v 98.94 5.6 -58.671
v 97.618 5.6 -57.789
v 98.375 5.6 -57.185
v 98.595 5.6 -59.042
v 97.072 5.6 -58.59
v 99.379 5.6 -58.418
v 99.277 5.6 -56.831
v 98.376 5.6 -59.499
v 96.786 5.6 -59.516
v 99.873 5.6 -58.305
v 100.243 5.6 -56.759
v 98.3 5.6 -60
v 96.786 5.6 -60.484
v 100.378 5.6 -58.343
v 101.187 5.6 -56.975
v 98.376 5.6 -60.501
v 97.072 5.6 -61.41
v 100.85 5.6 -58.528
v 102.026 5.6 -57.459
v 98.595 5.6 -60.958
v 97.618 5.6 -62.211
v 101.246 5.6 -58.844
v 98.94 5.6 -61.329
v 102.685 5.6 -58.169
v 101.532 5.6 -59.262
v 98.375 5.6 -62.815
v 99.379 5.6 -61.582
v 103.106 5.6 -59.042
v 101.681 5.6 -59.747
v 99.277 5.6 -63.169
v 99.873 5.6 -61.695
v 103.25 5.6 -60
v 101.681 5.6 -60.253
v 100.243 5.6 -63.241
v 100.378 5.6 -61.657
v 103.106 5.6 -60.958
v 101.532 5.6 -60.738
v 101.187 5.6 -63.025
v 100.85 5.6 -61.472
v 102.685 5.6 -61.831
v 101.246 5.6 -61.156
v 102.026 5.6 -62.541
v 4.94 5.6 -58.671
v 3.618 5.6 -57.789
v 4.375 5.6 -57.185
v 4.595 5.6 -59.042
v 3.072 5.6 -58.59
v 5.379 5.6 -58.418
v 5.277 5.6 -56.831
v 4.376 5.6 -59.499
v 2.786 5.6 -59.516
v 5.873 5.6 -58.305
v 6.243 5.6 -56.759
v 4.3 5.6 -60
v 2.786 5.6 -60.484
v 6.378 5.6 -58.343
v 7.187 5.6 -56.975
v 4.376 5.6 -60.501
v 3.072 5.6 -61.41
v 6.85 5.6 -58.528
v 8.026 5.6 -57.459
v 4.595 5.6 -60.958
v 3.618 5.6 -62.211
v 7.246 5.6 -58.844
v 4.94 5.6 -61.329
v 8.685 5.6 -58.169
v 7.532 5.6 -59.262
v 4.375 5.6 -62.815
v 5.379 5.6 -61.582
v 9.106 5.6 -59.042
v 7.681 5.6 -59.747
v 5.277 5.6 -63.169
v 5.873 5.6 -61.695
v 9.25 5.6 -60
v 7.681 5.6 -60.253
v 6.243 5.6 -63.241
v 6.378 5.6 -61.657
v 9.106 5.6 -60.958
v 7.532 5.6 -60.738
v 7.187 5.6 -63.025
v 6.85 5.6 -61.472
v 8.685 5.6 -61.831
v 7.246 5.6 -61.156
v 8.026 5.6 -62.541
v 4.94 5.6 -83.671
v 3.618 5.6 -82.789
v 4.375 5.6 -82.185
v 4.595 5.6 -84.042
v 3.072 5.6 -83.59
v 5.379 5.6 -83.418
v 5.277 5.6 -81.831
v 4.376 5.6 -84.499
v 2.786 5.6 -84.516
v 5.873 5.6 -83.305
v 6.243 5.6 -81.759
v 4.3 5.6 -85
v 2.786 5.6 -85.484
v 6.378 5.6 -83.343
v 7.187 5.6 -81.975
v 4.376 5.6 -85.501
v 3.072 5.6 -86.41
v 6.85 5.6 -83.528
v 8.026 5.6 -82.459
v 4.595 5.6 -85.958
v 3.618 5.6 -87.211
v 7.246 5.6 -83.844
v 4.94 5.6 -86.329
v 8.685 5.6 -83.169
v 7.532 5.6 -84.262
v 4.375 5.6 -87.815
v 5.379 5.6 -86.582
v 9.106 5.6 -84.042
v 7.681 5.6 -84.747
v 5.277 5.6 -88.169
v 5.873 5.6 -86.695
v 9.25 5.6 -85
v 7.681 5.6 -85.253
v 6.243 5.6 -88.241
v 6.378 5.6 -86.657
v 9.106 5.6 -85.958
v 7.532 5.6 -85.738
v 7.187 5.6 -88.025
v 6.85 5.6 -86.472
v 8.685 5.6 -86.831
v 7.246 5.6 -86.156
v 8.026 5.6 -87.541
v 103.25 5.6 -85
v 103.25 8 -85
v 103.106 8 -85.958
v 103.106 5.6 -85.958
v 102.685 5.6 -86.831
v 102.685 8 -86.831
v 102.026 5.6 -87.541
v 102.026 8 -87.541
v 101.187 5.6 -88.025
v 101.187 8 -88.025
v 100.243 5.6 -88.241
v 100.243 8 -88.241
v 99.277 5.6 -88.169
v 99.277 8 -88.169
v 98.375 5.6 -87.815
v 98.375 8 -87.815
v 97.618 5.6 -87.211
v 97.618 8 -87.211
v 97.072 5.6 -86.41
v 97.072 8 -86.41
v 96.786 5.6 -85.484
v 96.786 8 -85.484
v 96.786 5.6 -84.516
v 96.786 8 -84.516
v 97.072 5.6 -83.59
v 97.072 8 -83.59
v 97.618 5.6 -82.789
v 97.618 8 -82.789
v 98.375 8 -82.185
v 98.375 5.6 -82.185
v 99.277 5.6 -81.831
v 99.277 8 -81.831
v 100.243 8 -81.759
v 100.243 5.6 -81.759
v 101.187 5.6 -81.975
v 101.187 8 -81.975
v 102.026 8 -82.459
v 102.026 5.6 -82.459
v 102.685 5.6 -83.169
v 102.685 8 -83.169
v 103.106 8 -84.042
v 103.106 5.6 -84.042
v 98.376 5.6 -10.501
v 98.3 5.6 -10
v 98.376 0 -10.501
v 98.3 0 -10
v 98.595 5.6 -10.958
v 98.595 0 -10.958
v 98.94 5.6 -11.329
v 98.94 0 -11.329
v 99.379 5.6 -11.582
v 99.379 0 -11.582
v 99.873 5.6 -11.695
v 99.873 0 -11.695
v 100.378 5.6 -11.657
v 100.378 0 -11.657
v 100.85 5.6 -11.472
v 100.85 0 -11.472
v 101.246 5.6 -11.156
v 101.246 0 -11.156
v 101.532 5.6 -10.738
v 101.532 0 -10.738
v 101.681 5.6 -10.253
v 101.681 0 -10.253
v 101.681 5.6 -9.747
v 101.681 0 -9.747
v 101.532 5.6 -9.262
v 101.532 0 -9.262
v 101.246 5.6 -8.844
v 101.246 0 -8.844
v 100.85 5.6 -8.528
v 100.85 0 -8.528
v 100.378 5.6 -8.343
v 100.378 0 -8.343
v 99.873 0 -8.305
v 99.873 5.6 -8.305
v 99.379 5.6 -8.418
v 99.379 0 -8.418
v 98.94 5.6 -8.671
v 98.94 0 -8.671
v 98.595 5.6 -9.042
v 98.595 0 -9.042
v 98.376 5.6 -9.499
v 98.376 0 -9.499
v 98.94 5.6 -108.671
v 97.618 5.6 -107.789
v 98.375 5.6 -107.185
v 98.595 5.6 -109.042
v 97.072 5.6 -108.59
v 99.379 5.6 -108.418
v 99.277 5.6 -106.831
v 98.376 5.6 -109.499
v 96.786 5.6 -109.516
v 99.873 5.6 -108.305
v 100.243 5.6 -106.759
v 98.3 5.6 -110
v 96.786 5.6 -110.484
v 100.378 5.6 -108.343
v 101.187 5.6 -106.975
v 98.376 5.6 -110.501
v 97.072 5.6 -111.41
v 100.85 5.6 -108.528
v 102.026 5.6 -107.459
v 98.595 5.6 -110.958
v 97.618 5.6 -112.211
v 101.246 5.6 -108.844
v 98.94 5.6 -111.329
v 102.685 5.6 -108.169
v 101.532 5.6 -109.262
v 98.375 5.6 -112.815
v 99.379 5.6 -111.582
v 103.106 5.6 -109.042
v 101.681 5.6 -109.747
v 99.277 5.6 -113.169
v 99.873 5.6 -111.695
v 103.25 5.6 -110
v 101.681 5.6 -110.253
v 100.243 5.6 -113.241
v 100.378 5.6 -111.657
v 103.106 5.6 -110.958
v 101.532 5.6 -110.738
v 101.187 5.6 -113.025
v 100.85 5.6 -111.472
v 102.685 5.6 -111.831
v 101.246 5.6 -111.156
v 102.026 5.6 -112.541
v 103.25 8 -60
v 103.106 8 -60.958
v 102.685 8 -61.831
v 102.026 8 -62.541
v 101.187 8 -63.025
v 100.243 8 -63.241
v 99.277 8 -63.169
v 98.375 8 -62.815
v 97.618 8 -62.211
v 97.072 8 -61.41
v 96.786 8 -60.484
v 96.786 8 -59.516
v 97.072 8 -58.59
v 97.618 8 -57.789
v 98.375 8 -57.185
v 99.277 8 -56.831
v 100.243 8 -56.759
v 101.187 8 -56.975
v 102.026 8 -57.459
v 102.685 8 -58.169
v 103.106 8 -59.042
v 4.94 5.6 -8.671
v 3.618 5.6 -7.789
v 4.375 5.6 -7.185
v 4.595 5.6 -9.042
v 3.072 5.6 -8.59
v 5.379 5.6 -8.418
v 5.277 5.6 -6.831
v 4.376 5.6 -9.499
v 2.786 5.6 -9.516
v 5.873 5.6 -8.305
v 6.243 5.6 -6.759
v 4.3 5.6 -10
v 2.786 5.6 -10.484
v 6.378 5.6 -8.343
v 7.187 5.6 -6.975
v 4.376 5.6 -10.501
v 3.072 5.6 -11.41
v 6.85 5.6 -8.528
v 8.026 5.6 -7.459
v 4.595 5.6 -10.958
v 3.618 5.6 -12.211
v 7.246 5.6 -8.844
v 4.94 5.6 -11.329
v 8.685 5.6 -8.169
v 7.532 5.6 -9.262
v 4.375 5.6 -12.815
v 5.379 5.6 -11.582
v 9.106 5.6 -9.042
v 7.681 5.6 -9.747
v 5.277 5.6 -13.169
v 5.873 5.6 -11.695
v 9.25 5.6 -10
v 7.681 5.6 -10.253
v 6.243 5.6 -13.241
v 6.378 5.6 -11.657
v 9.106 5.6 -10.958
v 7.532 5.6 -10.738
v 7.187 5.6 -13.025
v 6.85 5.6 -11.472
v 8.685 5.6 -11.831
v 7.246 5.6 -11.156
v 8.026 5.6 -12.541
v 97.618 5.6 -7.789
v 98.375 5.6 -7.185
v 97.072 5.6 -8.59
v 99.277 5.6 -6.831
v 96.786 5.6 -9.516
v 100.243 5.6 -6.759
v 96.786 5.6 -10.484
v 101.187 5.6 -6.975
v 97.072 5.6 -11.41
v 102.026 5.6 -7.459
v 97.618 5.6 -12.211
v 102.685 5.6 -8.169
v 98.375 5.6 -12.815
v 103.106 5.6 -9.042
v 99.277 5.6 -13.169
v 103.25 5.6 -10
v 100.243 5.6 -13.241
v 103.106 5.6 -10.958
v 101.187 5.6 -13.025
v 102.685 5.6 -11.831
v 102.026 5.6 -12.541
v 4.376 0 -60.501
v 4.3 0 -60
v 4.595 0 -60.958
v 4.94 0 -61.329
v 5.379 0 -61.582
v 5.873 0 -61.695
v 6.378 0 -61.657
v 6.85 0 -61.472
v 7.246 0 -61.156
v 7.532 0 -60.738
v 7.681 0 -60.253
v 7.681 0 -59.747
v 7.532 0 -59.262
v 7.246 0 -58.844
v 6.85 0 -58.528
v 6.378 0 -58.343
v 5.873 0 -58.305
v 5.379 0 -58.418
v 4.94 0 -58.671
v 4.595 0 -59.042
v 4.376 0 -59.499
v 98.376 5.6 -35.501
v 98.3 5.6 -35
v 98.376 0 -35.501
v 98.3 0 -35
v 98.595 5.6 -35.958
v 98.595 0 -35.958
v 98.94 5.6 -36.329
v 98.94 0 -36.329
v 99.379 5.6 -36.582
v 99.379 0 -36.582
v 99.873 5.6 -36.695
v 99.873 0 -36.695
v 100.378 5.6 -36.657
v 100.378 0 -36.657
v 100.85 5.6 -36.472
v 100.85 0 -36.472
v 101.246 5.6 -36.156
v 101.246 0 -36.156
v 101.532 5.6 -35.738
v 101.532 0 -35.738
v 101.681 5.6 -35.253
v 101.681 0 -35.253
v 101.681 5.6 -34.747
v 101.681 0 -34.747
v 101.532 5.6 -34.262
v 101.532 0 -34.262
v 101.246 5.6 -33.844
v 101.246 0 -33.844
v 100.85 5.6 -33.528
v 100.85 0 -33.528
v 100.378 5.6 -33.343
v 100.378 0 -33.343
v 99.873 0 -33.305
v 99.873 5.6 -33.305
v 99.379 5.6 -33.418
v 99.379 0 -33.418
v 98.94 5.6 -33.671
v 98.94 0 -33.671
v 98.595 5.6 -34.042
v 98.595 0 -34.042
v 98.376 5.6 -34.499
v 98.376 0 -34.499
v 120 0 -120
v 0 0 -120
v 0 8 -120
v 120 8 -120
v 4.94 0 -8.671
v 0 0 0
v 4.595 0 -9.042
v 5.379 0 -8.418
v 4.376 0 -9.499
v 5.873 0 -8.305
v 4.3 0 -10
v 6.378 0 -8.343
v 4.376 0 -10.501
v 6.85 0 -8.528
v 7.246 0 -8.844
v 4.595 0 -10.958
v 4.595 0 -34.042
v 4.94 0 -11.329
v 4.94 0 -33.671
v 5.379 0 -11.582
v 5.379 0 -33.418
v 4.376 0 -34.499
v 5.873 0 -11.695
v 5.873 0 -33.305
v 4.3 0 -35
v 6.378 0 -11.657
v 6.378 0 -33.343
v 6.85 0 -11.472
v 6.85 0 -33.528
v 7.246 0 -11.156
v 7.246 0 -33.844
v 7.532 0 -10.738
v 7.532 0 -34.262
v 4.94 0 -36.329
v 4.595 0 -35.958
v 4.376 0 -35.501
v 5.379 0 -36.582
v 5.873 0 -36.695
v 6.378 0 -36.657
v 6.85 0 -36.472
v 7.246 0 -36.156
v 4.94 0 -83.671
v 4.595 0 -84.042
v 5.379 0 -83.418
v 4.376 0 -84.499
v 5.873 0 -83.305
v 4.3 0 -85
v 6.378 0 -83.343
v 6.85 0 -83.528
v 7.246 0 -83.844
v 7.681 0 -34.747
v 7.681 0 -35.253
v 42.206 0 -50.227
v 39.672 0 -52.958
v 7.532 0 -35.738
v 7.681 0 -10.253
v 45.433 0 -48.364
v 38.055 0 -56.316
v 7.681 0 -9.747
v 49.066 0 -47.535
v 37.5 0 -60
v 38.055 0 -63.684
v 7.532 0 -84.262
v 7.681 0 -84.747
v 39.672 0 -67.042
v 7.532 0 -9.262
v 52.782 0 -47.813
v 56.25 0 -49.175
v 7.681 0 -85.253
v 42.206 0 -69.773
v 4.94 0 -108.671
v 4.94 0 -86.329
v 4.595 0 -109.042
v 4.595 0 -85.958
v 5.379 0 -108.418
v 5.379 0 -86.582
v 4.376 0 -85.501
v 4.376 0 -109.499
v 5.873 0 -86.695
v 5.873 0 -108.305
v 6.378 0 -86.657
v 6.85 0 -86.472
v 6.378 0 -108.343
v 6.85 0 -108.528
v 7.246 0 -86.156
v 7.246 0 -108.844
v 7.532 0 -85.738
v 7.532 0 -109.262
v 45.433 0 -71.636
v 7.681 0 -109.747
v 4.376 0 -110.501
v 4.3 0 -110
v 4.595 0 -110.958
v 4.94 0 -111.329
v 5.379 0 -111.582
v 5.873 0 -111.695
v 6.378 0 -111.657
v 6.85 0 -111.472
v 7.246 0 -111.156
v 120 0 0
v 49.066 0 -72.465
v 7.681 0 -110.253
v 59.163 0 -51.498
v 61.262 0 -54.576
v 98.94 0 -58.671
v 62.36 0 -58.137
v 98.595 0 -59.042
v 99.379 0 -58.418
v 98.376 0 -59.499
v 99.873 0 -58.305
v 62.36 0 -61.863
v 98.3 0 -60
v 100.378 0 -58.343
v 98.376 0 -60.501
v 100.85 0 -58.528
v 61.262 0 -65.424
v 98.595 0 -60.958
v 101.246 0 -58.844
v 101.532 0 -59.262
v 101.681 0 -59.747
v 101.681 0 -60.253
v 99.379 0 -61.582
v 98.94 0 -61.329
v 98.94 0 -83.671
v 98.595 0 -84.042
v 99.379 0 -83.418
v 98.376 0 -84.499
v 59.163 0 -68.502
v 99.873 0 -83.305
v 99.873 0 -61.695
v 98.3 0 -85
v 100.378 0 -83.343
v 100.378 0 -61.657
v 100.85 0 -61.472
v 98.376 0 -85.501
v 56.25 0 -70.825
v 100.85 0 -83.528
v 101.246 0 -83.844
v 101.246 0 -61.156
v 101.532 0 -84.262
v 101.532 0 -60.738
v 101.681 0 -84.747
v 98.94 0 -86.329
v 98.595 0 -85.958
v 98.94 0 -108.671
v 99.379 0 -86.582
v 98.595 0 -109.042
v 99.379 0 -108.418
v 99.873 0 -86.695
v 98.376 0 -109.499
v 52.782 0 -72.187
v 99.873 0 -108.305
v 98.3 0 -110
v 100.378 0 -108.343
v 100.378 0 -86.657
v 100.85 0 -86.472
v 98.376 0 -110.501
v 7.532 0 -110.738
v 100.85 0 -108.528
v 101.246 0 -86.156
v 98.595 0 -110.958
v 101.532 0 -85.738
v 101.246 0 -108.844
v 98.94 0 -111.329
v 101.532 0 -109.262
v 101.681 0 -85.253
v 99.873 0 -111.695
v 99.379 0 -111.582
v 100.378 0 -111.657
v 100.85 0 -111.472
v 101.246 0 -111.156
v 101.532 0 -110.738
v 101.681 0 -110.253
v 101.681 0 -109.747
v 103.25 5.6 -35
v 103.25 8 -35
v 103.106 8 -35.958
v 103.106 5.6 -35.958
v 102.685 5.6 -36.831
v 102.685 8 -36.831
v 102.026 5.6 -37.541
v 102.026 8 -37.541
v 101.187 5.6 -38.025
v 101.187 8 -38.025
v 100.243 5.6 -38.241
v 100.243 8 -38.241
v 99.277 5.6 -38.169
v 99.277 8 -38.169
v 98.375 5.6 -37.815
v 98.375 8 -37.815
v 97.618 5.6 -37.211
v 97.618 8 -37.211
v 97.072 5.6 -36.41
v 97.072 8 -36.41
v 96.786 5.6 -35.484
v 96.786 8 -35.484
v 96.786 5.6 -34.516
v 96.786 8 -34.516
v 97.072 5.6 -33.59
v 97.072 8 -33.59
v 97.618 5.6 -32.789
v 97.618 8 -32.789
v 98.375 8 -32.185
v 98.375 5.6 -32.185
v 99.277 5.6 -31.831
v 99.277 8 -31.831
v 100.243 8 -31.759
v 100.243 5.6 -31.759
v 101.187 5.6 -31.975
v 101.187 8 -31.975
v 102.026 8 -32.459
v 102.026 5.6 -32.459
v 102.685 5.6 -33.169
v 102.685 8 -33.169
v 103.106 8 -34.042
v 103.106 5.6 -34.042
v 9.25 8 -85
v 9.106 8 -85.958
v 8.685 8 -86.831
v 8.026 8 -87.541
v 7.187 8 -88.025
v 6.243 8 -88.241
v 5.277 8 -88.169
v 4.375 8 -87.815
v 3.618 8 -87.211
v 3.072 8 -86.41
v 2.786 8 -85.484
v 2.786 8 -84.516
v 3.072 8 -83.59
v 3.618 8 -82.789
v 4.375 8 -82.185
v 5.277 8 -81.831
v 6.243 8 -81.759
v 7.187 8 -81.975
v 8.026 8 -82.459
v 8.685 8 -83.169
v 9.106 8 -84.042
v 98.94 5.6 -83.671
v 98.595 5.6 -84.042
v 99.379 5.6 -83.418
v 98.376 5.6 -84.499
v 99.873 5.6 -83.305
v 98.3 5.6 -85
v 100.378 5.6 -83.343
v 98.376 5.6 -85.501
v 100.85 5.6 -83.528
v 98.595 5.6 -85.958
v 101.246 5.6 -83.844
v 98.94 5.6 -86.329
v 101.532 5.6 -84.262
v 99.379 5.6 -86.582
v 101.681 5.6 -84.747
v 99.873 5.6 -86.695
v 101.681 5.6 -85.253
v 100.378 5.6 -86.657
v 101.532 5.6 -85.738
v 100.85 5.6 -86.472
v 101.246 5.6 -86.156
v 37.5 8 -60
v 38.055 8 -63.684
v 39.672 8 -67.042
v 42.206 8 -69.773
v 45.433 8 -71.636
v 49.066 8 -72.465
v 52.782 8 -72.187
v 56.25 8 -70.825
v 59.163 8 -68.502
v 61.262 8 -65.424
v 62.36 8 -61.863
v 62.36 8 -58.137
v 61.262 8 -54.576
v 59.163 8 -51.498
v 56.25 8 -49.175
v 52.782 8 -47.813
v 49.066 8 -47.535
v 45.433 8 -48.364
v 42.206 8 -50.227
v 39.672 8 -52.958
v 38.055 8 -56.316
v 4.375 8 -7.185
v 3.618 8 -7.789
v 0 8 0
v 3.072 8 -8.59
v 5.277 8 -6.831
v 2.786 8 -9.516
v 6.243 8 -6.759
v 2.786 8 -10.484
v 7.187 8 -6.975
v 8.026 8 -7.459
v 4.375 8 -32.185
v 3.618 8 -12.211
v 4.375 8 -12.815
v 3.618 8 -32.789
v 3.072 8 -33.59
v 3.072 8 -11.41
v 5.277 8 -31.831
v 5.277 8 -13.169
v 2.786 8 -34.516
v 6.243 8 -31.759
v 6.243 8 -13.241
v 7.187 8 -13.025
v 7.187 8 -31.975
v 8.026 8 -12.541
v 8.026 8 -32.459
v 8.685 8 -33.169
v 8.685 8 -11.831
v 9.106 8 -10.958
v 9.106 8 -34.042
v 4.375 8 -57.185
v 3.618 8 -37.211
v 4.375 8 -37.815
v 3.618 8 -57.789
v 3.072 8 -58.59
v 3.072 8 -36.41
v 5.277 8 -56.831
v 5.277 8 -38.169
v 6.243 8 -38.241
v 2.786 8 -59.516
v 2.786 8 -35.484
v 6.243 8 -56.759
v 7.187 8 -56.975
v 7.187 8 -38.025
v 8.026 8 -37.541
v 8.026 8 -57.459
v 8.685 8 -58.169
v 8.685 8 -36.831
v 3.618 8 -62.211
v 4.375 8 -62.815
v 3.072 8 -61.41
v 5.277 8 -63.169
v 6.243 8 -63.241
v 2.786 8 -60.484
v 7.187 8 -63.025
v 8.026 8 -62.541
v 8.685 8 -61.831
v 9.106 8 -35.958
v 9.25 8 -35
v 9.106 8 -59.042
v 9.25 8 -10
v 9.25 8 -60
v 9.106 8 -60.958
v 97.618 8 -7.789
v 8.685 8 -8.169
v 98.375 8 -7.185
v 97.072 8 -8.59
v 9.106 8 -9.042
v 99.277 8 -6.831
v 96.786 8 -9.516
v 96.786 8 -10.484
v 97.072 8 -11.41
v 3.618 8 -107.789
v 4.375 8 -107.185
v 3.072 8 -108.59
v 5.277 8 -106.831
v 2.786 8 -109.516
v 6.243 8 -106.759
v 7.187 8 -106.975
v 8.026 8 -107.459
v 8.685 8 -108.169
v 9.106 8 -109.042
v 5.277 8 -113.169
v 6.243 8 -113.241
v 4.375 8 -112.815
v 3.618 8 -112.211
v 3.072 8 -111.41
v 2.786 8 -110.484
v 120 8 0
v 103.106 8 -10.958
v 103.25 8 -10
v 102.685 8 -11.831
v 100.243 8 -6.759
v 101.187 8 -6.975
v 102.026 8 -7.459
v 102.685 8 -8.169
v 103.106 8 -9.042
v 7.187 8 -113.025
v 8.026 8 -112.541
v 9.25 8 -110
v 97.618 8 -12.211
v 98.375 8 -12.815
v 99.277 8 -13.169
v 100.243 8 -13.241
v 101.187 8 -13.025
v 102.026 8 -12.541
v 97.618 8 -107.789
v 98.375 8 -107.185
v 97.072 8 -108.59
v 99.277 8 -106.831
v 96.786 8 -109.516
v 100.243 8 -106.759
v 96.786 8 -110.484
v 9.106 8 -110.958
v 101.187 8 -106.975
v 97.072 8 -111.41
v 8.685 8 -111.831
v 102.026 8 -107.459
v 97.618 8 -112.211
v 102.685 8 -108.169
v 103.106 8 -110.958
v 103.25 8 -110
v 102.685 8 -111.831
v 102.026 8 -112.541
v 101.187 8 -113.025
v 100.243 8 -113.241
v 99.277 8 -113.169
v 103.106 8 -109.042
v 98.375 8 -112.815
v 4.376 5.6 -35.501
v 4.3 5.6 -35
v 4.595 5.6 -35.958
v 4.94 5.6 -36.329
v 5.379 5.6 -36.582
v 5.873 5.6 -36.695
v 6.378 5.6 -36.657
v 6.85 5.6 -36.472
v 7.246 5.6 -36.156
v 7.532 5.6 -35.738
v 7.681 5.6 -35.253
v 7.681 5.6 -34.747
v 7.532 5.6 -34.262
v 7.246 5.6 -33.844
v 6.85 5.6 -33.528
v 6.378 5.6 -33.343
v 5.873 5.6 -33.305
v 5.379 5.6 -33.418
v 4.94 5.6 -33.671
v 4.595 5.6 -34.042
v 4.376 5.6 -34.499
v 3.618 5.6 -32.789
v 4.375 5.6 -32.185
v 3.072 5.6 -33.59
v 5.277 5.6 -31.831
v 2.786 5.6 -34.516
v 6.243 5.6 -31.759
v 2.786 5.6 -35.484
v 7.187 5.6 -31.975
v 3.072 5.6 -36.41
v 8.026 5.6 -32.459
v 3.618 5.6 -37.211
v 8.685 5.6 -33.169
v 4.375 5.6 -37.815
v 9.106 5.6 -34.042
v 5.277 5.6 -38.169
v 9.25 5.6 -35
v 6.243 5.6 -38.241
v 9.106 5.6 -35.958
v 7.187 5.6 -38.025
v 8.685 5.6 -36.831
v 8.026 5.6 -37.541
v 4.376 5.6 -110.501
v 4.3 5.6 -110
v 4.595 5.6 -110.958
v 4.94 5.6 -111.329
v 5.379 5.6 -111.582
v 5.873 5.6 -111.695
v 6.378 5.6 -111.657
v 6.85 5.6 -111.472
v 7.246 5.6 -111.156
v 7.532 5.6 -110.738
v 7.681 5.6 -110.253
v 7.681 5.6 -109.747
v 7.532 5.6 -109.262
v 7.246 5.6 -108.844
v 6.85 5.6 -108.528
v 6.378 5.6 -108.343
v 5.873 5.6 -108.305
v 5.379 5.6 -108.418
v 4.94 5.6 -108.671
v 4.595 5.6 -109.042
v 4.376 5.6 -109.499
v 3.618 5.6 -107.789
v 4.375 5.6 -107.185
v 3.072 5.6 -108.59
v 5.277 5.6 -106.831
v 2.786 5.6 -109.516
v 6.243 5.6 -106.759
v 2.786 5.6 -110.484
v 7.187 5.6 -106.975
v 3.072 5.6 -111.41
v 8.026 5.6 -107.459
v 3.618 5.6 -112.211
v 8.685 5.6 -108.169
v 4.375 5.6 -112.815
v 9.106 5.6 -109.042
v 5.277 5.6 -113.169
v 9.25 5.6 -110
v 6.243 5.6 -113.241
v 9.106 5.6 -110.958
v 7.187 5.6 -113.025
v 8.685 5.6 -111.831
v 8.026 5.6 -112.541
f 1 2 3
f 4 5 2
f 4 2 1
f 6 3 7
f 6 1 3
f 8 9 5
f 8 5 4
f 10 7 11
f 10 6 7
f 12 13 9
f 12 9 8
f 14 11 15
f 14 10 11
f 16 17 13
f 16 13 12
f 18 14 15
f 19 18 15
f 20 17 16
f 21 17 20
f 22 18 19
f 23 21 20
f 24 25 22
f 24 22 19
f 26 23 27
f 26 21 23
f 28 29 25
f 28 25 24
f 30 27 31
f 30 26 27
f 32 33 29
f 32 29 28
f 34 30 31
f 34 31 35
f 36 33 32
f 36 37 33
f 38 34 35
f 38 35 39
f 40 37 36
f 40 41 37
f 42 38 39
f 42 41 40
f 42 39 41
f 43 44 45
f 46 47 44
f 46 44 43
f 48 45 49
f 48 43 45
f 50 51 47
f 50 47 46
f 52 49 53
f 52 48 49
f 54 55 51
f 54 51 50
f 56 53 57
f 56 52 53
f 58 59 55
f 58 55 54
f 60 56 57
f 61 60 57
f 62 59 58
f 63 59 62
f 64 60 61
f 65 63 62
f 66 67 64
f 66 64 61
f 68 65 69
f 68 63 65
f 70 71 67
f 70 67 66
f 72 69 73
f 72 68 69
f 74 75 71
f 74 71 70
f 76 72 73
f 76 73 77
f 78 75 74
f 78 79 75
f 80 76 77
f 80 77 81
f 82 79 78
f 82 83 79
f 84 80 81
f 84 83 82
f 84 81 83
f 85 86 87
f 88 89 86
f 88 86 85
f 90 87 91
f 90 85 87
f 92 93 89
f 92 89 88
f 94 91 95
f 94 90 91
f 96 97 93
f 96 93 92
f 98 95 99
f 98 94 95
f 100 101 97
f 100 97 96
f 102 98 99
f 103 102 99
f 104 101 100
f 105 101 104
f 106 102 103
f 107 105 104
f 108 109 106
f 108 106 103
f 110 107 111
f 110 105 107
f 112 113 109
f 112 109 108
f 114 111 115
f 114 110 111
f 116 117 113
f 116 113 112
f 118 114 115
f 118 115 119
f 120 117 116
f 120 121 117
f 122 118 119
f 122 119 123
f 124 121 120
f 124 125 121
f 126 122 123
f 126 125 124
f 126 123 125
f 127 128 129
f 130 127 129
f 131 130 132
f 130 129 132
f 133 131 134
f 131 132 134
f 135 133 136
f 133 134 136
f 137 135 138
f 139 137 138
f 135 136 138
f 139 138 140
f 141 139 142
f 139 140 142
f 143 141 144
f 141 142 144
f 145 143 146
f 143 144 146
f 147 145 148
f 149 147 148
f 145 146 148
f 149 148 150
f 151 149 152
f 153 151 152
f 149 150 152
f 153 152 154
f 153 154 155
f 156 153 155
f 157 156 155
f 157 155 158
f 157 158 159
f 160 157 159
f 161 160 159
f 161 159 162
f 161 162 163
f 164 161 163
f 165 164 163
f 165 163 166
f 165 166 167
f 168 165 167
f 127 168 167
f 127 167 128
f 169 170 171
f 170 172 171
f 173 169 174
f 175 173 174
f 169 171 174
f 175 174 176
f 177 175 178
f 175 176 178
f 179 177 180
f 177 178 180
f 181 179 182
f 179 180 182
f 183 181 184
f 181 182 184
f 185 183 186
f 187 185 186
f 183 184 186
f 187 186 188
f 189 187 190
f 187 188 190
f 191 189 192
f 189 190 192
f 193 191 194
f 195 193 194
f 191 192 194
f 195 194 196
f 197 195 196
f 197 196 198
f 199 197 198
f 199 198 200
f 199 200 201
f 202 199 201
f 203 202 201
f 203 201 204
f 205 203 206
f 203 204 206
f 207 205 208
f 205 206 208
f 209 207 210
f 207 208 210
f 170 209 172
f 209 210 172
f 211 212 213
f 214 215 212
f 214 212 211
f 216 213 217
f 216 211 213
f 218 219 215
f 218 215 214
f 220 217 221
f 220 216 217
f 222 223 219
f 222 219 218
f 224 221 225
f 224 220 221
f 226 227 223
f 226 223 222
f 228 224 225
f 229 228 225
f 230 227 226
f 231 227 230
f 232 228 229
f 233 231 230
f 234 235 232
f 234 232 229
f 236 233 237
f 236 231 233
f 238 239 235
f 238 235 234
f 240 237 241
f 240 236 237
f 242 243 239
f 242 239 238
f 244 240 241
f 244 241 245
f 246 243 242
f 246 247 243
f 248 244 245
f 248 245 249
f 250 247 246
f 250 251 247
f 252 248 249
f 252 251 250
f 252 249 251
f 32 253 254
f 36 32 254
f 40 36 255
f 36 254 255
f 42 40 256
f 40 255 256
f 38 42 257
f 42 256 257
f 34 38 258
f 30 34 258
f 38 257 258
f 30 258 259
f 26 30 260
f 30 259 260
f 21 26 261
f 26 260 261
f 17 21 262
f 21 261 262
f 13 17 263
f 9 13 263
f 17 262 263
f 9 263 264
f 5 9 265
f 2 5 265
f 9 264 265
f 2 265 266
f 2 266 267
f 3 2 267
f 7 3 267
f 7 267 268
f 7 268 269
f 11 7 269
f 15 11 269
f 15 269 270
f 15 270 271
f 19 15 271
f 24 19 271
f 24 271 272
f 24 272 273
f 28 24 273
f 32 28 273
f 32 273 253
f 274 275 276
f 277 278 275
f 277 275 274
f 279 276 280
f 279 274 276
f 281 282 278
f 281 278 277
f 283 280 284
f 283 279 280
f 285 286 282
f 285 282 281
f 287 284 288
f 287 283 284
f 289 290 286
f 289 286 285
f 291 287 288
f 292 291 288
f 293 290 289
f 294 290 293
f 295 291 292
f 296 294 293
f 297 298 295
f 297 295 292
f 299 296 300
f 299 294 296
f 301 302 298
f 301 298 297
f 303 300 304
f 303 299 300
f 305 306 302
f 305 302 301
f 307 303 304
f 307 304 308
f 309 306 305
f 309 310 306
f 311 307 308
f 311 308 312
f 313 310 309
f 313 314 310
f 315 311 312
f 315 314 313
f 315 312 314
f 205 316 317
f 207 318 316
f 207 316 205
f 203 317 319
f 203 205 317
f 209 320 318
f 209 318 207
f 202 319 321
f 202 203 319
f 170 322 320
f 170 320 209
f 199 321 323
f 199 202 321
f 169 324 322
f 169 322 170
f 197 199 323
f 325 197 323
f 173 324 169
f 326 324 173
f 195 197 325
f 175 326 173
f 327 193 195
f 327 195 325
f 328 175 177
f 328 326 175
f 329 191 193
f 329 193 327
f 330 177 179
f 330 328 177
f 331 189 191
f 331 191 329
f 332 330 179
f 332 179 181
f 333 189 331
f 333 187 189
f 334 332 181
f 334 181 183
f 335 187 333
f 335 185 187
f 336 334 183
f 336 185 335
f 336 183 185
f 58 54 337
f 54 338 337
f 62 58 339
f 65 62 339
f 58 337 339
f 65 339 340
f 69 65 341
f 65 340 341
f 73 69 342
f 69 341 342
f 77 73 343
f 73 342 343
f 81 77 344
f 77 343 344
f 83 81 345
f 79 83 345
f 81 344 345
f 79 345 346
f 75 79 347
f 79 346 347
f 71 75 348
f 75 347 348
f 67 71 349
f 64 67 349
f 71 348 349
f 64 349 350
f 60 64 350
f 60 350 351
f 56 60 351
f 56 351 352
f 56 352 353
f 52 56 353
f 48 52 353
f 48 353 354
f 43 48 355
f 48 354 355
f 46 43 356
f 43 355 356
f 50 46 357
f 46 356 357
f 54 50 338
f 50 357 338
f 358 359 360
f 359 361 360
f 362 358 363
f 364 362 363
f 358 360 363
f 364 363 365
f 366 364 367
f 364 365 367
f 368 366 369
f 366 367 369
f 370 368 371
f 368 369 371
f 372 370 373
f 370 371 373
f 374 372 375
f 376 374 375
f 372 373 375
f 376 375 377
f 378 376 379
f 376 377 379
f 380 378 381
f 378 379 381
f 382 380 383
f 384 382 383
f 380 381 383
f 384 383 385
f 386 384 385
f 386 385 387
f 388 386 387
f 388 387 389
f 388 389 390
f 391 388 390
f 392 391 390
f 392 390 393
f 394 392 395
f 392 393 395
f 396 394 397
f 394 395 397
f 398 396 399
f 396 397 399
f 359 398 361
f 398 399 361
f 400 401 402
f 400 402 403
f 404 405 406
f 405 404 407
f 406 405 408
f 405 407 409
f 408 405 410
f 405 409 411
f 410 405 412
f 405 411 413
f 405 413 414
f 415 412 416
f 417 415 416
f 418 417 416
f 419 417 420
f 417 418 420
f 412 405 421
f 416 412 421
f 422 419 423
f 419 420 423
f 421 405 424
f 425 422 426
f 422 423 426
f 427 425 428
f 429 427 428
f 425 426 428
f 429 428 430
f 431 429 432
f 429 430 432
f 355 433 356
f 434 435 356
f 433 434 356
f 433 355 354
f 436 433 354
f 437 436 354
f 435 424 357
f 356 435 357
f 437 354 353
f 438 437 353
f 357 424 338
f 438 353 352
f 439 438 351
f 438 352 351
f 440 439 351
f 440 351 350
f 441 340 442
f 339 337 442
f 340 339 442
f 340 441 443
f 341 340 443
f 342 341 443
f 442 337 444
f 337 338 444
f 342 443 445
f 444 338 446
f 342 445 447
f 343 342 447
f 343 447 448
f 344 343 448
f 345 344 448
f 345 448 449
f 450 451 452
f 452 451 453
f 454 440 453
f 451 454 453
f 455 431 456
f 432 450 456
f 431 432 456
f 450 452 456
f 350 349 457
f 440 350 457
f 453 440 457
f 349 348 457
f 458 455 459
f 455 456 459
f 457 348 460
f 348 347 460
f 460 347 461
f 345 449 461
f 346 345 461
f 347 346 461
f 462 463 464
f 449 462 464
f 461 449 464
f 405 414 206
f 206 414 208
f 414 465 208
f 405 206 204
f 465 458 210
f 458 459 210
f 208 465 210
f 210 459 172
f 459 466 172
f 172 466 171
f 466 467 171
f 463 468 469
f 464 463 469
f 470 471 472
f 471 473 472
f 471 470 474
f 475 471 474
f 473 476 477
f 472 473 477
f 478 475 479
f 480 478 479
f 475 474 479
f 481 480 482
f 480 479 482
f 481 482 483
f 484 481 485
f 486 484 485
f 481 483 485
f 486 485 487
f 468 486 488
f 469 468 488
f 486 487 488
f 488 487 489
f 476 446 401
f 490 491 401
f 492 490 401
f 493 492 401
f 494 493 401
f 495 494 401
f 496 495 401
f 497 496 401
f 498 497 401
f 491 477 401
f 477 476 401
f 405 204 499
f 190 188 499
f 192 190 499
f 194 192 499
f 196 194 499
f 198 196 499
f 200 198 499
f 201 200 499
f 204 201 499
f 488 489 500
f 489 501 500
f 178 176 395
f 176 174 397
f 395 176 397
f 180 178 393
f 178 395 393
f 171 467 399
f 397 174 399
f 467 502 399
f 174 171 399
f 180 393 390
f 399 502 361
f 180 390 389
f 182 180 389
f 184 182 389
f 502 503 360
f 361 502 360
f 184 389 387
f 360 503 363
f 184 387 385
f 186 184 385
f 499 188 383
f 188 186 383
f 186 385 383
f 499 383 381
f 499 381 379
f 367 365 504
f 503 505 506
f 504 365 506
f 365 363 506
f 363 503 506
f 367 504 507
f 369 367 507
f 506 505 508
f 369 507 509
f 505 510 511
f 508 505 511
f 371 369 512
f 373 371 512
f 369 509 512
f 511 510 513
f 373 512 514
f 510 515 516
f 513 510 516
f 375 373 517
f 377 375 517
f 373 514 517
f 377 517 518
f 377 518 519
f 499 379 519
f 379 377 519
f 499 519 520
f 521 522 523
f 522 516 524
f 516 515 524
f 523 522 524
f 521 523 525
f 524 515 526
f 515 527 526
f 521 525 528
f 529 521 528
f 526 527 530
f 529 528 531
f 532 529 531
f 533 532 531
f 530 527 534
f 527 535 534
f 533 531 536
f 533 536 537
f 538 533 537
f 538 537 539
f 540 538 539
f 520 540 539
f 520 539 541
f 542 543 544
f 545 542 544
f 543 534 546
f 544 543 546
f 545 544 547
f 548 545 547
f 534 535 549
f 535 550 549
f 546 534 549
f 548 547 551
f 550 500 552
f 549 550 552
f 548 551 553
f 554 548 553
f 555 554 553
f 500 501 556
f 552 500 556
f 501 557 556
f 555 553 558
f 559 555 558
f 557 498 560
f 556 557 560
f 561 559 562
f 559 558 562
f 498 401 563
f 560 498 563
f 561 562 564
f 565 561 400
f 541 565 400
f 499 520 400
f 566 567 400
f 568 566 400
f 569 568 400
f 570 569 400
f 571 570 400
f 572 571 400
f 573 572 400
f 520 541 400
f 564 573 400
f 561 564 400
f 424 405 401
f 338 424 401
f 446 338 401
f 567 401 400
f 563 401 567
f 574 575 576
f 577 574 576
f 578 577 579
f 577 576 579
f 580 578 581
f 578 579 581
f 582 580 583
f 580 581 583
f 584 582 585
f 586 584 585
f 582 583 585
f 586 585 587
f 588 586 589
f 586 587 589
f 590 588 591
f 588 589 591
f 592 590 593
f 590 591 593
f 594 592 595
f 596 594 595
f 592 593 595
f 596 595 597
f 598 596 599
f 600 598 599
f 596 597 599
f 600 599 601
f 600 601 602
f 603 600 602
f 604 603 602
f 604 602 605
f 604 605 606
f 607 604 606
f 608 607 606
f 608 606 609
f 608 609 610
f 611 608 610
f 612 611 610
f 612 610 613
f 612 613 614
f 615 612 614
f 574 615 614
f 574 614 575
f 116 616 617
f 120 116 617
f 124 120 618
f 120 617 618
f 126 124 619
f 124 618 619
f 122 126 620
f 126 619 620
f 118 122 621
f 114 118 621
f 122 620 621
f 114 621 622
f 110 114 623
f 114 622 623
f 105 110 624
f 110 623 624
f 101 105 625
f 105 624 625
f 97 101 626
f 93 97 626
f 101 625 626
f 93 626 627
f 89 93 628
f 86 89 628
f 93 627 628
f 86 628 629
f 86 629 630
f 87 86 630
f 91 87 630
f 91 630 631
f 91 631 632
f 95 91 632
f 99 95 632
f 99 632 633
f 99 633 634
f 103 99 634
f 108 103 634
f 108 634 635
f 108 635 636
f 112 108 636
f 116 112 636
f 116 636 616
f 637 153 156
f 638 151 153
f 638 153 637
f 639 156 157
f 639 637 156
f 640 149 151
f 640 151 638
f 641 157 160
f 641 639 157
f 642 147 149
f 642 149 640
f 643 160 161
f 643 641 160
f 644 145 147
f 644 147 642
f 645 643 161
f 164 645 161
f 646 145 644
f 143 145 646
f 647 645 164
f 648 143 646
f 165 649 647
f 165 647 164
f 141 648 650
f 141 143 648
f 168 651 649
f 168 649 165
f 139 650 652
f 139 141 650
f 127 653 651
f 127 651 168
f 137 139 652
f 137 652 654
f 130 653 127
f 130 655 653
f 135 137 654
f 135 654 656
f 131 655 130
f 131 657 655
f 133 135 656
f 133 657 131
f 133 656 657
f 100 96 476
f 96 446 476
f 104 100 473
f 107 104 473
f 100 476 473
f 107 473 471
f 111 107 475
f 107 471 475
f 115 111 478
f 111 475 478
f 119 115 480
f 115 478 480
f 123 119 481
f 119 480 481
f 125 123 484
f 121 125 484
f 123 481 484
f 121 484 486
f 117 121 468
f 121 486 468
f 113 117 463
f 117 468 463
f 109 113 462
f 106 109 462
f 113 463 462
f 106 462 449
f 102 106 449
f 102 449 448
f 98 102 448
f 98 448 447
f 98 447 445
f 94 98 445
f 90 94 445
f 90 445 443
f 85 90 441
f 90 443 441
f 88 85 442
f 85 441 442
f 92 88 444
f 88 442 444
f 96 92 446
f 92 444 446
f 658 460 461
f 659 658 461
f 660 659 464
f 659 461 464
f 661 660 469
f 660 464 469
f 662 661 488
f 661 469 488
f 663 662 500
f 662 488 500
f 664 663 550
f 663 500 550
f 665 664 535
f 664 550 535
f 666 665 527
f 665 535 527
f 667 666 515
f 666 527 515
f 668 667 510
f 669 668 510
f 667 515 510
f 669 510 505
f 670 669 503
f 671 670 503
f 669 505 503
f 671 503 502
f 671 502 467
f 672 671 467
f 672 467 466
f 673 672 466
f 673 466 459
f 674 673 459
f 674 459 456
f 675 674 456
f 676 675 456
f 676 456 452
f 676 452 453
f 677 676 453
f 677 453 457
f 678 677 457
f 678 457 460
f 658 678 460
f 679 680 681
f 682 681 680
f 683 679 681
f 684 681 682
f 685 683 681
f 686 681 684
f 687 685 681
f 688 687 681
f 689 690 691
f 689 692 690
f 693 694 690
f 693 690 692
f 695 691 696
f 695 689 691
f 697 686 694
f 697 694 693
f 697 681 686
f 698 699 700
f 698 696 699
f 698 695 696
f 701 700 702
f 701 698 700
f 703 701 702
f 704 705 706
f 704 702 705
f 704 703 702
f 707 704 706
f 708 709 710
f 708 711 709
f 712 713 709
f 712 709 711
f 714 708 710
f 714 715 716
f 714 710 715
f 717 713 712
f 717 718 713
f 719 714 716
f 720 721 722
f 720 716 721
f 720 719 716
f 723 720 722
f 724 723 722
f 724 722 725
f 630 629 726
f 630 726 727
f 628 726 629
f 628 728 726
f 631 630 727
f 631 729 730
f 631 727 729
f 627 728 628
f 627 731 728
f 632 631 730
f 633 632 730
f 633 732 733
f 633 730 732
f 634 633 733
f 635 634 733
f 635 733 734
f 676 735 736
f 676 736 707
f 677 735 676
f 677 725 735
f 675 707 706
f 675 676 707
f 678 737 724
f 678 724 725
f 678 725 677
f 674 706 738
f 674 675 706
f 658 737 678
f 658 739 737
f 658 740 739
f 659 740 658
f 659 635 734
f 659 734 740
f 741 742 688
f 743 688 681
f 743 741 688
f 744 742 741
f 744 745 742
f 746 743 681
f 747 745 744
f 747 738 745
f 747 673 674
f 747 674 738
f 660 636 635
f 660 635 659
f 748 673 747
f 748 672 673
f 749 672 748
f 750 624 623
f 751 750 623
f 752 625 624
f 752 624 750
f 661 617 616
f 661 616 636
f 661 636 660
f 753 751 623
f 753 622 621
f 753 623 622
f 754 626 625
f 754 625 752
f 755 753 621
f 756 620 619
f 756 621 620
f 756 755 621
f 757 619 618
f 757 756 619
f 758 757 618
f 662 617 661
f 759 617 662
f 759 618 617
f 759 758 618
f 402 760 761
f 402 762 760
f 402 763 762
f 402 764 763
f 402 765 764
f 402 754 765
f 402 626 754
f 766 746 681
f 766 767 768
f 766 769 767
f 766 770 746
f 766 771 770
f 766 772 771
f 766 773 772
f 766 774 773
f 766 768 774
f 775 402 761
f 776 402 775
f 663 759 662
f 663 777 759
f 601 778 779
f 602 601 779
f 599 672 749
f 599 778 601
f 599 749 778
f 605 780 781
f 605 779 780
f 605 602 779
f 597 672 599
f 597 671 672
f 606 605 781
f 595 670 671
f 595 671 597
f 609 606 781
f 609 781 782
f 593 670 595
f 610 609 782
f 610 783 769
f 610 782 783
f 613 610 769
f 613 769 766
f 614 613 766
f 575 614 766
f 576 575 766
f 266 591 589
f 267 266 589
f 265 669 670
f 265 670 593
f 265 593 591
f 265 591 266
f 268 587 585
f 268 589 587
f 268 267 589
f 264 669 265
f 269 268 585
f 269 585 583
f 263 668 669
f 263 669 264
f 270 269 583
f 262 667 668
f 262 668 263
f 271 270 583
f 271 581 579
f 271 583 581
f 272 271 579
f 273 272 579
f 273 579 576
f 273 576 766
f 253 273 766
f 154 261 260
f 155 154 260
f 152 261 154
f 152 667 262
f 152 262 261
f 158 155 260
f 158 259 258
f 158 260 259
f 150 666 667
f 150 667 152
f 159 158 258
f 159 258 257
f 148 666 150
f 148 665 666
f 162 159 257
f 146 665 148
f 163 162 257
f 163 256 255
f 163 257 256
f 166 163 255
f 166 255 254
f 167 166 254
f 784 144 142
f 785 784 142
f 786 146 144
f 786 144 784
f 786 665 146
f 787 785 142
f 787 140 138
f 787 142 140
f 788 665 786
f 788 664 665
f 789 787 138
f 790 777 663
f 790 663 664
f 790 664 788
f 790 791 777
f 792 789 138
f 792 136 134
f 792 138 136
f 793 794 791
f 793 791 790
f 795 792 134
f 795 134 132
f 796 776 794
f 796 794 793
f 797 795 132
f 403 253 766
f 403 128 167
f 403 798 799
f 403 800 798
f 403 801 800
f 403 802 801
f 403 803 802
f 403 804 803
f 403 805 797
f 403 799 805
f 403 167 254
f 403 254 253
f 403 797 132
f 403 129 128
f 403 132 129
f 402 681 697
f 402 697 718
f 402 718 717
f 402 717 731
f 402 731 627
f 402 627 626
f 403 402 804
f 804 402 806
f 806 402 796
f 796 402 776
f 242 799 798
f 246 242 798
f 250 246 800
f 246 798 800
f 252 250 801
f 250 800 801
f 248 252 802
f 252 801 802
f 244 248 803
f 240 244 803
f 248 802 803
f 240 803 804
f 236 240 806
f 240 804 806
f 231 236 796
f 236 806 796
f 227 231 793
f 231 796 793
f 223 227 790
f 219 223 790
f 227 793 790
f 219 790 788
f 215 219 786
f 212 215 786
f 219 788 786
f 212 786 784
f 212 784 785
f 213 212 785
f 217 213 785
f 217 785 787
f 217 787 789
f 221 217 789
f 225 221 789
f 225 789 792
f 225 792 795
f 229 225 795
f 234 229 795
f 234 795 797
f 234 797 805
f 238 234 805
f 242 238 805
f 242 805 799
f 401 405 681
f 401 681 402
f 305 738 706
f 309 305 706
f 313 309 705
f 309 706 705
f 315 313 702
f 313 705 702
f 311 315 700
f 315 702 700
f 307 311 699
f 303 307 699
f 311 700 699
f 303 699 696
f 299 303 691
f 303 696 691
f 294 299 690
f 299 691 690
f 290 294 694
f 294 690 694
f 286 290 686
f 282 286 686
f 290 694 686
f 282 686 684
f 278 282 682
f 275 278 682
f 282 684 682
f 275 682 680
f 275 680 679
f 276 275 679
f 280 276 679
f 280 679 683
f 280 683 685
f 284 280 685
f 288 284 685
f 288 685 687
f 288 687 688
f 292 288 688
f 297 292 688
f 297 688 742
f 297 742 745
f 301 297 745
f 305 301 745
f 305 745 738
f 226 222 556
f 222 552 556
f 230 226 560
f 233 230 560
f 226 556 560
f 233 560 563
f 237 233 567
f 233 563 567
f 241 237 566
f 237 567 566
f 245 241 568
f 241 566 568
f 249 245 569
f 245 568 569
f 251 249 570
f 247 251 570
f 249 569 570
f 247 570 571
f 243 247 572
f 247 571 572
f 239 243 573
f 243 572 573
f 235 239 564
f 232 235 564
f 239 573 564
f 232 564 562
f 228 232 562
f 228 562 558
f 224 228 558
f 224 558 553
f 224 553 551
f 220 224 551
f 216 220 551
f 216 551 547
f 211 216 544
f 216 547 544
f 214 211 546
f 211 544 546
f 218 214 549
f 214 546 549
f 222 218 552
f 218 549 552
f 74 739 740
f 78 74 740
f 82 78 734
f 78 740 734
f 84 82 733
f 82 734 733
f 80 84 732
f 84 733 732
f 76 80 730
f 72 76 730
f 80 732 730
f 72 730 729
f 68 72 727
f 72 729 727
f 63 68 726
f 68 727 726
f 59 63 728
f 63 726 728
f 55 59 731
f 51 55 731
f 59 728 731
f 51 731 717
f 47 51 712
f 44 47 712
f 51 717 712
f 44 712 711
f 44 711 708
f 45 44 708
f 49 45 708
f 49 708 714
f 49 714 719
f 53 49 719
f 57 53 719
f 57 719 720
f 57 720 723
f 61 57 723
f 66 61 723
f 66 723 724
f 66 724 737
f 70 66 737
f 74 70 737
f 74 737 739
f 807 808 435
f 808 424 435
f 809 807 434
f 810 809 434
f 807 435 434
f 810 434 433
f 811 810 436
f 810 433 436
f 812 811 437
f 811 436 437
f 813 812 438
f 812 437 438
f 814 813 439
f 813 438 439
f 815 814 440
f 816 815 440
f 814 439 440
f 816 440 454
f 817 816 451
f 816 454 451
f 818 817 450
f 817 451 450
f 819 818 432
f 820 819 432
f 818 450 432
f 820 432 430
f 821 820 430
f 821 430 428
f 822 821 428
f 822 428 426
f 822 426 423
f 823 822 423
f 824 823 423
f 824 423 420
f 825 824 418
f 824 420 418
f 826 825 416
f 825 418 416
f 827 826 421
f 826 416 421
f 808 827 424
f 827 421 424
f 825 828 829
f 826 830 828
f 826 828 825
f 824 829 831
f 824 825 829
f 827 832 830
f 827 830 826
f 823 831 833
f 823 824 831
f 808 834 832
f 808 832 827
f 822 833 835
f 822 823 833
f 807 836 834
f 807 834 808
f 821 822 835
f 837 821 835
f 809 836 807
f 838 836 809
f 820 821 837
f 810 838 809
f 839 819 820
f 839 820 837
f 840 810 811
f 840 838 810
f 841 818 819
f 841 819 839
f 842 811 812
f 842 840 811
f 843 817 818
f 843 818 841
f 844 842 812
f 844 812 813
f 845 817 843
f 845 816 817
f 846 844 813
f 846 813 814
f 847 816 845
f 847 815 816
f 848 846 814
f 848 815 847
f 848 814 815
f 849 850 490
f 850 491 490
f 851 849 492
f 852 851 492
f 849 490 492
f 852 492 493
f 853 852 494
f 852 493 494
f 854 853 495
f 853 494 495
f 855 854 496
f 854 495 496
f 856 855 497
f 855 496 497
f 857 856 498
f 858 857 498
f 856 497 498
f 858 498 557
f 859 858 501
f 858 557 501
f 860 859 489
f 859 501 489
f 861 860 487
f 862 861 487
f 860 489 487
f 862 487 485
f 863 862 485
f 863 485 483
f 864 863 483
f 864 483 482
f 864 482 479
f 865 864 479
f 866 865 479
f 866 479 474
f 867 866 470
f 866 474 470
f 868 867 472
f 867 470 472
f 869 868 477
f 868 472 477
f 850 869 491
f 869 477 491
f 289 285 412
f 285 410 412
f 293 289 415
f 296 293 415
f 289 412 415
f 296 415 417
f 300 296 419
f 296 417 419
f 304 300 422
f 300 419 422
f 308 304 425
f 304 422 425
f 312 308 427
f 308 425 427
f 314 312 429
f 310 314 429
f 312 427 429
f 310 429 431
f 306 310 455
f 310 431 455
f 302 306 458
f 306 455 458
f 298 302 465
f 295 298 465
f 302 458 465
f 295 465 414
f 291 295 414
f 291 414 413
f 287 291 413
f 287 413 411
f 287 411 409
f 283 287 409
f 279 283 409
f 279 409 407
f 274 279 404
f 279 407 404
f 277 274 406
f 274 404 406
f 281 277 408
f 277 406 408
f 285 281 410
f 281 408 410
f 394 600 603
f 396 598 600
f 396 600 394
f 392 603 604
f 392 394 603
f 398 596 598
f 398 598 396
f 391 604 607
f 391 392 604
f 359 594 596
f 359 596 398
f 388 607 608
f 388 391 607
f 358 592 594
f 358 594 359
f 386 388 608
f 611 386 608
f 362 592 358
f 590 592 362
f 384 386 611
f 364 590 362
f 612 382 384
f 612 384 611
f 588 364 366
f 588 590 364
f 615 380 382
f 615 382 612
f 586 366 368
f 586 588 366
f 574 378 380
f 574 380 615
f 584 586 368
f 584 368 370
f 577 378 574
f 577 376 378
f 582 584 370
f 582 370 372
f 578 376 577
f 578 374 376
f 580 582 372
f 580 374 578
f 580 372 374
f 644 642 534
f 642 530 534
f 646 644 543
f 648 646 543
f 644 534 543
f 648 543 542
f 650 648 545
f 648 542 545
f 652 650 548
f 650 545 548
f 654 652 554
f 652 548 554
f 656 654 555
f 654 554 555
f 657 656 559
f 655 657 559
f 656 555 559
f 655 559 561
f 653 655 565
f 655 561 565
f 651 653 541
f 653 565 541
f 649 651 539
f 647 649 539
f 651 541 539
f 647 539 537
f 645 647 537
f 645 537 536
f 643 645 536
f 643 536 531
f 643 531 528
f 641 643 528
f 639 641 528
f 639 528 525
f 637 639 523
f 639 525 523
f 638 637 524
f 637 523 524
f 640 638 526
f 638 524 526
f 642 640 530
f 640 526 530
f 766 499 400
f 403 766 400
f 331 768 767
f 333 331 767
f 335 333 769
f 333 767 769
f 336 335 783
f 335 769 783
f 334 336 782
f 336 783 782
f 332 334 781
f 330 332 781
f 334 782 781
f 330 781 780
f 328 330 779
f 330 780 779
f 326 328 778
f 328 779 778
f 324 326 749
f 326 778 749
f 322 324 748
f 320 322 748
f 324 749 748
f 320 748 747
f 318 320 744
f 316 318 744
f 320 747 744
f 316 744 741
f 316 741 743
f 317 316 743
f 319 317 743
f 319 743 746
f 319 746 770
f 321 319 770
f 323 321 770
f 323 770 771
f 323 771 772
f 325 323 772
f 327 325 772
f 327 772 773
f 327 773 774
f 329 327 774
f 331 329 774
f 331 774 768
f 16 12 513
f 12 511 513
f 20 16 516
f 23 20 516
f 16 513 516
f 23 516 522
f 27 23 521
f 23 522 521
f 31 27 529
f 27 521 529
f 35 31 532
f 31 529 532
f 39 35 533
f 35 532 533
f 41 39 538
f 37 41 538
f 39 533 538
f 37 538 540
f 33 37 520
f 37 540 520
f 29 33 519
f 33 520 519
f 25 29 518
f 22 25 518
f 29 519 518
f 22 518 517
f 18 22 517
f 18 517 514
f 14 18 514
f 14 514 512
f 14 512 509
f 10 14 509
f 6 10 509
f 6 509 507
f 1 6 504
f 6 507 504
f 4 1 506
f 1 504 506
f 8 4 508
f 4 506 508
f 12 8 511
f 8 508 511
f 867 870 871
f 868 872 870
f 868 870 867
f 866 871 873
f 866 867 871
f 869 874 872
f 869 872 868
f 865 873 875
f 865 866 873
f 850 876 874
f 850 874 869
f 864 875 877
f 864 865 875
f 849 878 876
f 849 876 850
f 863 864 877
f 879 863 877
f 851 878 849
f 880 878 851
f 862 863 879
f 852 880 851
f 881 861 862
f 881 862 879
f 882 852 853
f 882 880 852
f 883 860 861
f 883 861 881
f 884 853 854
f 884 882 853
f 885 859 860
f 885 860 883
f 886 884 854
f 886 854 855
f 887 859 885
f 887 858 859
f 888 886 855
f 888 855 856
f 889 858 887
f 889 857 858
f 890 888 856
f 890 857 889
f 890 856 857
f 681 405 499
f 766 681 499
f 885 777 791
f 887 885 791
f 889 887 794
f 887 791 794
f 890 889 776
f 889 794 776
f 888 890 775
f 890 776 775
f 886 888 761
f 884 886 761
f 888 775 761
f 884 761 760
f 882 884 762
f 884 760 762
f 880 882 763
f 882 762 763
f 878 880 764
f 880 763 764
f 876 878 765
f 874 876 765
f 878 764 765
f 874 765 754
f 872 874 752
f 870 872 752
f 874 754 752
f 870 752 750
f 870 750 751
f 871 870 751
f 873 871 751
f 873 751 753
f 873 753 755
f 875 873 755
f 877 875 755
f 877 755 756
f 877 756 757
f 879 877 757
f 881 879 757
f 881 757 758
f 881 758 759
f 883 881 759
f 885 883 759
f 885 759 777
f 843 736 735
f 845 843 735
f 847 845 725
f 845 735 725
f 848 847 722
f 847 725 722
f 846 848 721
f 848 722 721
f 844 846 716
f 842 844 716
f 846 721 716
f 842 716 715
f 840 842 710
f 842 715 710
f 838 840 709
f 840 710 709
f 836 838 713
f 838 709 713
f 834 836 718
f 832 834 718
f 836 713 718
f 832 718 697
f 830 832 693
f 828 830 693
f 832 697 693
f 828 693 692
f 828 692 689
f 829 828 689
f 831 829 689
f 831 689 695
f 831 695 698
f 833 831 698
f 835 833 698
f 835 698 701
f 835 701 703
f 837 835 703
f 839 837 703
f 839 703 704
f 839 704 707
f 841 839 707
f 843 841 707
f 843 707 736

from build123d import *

# Parameters (mm, degrees)
SKETCH1_W                                            = 120
SKETCH1_H                                            = 120
BOSS_EXTRUDE1_DEPTH                                  = 8
CBORE_FOR_M3_HEX_SOCKET_THIN_HEAD_CAP_SC_D           = 3.4
CBORE_FOR_M3_HEX_SOCKET_THIN_HEAD_CAP_SC_CBORE_D     = 6.5
CBORE_FOR_M3_HEX_SOCKET_THIN_HEAD_CAP_SC_CBORE_DEPTH = 2.4
F_25_0MM_DOWEL_HOLE1_D                               = 25
F_25_0MM_DOWEL_HOLE1_DEPTH                           = 10
F_25_0MM_DOWEL_HOLE1_TIP                             = 7.510757738


with BuildPart() as part:
    # Sketch1 → Boss-Extrude1 (new body)
    with BuildSketch(Plane(origin=(0, 0, 0), x_dir=(1, 0, 0), z_dir=(0, 1, 0))):
        with Locations((60, 60)):
            Rectangle(SKETCH1_W, SKETCH1_H)
    extrude(amount=BOSS_EXTRUDE1_DEPTH)

    # CBORE for M3 Hex Socket Thin Head Cap Screw1 (through all)
    with Locations(Plane(origin=(0, 8, 0), x_dir=(1, 0, 0), z_dir=(0, 1, 0))):
        with Locations((100, 110), (6, 110), (6, 85), (6, 60), (6, 35), (6, 10), (100, 60), (100, 35), (100, 10), (100, 85)):
            CounterBoreHole(CBORE_FOR_M3_HEX_SOCKET_THIN_HEAD_CAP_SC_D / 2, CBORE_FOR_M3_HEX_SOCKET_THIN_HEAD_CAP_SC_CBORE_D / 2, CBORE_FOR_M3_HEX_SOCKET_THIN_HEAD_CAP_SC_CBORE_DEPTH)

    # Ø25.0mm Dowel Hole1
    with Locations(Plane(origin=(0, 8, 0), x_dir=(1, 0, 0), z_dir=(0, 1, 0))):
        with Locations((50, 60)):
            Hole(F_25_0MM_DOWEL_HOLE1_D / 2, depth=F_25_0MM_DOWEL_HOLE1_DEPTH)
            with Locations((0, 0, -(F_25_0MM_DOWEL_HOLE1_DEPTH + F_25_0MM_DOWEL_HOLE1_TIP / 2))):  # 118° drill point
                Cone(0, F_25_0MM_DOWEL_HOLE1_D / 2, F_25_0MM_DOWEL_HOLE1_TIP, mode=Mode.SUBTRACT)


solid = part.part
